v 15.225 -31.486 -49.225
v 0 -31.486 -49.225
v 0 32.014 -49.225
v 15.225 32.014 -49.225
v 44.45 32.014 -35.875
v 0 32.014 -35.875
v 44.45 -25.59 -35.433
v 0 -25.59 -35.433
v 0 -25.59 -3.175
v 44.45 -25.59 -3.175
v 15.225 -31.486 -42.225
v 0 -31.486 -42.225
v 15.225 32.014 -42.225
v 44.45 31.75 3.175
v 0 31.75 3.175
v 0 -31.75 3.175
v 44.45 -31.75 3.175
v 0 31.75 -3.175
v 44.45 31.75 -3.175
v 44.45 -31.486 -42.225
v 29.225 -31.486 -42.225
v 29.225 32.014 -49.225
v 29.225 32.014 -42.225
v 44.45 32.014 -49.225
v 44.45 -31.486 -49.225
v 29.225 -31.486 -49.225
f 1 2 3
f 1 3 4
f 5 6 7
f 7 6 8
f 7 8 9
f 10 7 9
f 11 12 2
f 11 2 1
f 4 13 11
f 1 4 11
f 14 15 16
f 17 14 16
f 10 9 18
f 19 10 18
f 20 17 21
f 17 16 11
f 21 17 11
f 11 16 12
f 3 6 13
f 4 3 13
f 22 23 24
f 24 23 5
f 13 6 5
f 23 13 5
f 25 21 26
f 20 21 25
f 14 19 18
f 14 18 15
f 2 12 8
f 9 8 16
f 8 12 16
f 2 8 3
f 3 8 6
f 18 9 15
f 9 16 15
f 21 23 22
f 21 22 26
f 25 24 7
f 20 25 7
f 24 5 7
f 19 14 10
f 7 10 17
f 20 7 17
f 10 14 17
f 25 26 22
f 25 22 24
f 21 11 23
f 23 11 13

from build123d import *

# Parameters (mm, degrees)
F1_DEPTH = 44.45
F2_W     = 15.225
F2_H     = 63.5
F3_DEPTH = 7


with BuildPart() as f1:
    # F0 (on Right) → F1 (new body)
    with BuildSketch(Plane.YZ):
        Polygon((-25.589595, -3.175), (31.75, -3.175), (31.75, 3.175), (-31.75, 3.175), (-31.485815, -42.22507), (32.014185, -42.22507), (32.014185, -35.87507), (-25.589595, -35.433), align=None)
    extrude(amount=F1_DEPTH)

    # F2 (on face) → F3 (join)
    with BuildSketch(Plane(origin=(0, 0, -42.22507), x_dir=(1, 0, 0), z_dir=(0, 0, -1))):
        with Locations((36.8375, -0.264185)):
            Rectangle(F2_W, F2_H)
        with Locations((7.6125, -0.264185)):
            Rectangle(F2_W, F2_H)
    extrude(amount=F3_DEPTH)


solid = f1.part
